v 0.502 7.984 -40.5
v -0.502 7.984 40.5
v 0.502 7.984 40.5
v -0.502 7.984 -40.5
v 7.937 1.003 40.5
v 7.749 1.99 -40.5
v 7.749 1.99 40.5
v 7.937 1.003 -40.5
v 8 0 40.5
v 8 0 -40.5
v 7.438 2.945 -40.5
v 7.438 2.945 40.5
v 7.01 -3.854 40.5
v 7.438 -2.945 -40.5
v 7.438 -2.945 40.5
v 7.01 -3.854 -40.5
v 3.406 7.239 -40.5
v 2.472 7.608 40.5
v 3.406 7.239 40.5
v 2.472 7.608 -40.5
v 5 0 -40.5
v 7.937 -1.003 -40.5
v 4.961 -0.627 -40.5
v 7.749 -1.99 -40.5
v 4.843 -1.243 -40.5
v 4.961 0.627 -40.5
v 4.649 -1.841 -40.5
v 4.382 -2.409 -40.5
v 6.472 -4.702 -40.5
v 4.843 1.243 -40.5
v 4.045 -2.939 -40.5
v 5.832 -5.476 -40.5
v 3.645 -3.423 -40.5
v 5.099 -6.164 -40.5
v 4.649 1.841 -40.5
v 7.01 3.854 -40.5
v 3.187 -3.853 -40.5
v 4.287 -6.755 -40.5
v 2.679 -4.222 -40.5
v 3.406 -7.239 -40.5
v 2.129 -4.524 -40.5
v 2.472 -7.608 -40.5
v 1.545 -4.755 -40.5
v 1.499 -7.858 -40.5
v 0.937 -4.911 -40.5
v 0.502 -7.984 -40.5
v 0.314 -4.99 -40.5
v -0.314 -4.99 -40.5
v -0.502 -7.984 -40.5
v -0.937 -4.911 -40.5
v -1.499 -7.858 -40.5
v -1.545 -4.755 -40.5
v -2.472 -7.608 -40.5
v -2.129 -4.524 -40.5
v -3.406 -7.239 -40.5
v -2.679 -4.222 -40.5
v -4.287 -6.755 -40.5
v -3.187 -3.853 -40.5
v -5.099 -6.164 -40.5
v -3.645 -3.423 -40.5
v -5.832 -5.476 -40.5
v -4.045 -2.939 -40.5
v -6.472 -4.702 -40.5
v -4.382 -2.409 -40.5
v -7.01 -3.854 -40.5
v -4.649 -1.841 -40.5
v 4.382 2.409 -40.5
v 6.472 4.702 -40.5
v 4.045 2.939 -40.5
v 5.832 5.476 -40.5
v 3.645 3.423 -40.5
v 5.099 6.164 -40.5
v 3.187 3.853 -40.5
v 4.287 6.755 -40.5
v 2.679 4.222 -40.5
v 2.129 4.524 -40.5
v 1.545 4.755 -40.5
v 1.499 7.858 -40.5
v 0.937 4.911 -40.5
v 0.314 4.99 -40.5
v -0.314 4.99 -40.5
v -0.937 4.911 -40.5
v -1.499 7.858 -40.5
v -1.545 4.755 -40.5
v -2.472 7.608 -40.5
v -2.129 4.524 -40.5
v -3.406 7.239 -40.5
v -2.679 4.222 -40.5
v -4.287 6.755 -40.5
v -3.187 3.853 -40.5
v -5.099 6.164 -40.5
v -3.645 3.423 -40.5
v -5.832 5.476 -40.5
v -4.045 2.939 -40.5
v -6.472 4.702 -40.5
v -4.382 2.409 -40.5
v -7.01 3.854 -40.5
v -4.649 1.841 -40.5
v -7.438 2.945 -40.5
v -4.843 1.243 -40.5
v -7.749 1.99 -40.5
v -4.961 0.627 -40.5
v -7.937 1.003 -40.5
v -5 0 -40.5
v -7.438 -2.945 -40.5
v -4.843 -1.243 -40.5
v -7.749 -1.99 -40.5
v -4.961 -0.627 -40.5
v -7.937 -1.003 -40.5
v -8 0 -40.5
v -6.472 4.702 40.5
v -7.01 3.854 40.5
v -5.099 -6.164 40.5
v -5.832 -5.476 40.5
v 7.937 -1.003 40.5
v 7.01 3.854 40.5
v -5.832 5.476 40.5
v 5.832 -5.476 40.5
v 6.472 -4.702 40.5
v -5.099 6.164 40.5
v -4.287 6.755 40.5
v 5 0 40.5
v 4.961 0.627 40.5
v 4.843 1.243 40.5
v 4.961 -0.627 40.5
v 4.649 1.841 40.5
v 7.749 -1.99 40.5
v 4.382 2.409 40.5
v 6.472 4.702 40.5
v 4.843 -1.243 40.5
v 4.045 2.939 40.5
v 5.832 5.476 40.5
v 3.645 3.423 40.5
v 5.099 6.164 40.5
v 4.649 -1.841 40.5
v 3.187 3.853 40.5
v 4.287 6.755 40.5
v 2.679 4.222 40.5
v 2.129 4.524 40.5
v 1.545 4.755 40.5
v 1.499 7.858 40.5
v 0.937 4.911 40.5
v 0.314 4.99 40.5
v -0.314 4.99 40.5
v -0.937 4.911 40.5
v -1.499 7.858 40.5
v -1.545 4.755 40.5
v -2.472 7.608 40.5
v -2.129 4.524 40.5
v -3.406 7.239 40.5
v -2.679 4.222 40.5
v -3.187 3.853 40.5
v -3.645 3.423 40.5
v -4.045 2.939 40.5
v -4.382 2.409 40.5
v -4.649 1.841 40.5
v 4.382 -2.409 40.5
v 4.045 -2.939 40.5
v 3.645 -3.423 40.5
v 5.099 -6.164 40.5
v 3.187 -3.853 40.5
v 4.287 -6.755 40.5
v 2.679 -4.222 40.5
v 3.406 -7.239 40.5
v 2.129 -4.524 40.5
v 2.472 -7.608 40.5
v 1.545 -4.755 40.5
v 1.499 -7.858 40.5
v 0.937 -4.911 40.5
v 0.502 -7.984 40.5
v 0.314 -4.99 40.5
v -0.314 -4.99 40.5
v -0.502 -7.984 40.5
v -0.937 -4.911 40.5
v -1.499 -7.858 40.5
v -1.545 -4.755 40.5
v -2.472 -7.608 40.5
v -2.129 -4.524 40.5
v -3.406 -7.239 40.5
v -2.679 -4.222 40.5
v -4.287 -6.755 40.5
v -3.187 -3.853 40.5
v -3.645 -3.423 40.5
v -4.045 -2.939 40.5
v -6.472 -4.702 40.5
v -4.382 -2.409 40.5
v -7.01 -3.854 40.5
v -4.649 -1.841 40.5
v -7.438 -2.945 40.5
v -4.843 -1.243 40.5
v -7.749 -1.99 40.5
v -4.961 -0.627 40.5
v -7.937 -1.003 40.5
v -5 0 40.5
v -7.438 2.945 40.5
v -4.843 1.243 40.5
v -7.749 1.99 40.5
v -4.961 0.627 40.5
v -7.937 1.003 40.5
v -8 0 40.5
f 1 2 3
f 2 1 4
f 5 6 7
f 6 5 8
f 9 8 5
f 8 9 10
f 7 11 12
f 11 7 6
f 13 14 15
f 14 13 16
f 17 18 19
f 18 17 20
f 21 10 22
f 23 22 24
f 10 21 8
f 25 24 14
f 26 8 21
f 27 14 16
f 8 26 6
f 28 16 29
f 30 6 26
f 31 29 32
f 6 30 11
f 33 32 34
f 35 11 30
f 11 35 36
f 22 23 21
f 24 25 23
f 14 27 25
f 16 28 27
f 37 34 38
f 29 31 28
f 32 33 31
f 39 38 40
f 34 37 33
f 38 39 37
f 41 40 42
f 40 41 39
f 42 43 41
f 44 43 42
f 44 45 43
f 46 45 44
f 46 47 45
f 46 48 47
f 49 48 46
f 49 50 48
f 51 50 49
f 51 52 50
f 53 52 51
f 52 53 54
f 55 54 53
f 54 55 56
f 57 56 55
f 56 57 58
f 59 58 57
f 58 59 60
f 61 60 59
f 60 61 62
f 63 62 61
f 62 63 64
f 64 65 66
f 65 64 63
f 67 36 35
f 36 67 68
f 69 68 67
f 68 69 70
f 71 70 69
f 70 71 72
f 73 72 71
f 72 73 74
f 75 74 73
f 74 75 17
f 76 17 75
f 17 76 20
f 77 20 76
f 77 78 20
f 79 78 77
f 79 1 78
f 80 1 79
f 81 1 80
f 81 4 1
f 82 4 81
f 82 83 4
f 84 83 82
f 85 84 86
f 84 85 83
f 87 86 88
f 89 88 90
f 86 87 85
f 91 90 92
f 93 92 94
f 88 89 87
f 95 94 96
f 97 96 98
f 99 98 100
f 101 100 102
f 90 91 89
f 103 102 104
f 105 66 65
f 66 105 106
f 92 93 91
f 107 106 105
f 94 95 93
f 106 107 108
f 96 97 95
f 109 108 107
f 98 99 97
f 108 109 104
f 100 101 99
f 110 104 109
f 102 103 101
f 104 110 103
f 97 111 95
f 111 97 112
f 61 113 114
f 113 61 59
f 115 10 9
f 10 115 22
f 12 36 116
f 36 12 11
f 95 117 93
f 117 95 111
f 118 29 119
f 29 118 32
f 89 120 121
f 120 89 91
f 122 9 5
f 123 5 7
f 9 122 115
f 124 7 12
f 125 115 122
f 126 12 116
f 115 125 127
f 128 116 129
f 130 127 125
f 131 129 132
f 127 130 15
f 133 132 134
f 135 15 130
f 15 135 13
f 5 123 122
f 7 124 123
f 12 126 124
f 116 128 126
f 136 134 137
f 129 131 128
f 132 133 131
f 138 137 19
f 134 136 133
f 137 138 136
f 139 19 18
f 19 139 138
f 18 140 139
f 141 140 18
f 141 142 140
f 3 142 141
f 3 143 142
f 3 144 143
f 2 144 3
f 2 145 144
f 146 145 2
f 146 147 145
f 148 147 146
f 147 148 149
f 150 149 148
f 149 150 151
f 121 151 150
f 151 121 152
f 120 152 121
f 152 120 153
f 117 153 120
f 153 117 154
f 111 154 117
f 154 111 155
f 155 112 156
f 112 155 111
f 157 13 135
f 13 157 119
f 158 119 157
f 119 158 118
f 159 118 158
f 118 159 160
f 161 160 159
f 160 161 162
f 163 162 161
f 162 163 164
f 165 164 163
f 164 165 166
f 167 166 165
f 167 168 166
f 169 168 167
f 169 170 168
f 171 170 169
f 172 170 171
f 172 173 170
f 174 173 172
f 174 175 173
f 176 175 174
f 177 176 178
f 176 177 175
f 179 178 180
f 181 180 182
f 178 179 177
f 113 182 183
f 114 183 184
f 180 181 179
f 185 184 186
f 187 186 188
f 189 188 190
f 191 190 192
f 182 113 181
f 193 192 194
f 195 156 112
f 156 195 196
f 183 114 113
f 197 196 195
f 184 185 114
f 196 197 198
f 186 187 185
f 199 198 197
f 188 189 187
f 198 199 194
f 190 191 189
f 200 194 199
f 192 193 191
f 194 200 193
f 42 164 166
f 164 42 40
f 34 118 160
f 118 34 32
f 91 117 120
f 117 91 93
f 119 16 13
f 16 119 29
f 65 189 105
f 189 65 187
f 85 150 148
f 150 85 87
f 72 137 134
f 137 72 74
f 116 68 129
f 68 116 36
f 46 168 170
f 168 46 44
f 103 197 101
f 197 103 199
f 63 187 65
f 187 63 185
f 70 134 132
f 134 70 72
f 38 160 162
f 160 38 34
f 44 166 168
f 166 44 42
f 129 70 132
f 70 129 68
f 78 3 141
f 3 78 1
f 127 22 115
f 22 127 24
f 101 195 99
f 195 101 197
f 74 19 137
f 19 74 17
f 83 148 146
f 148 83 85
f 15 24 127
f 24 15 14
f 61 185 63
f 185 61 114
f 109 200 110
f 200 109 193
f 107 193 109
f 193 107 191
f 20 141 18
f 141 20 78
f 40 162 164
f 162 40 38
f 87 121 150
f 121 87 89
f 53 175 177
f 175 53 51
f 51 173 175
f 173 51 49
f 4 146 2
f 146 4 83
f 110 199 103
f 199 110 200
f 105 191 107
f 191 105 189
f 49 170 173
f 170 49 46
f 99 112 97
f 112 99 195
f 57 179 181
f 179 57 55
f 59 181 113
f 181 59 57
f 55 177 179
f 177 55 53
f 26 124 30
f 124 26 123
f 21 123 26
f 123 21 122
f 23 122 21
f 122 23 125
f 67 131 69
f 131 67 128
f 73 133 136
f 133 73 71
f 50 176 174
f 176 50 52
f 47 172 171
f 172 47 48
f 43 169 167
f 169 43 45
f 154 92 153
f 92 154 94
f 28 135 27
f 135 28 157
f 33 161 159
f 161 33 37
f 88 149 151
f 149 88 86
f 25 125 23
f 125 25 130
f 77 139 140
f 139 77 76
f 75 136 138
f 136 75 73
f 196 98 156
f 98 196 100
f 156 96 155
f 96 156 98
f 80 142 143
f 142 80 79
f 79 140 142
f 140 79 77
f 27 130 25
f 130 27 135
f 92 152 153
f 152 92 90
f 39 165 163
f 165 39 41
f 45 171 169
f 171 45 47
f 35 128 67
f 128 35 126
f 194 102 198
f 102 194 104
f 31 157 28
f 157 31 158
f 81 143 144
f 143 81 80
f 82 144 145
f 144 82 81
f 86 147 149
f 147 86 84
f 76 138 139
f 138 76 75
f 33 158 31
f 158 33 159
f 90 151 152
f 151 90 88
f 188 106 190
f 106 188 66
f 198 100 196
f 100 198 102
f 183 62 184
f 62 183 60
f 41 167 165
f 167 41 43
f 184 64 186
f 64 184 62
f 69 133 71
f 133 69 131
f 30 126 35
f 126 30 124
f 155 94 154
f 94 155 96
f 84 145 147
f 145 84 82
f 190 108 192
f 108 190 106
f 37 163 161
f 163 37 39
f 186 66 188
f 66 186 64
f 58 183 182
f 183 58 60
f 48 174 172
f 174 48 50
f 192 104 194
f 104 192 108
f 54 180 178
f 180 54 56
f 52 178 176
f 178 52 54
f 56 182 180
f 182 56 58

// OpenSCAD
$fn = 50;


difference() {
	union() {
		translate(v = [0, 0, -40.5000000000]) {
			cylinder(h = 81, r = 8.0000000000);
		}
	}
	union() {
		translate(v = [0, 0, -100.0000000000]) {
			cylinder(h = 200, r = 5.0000000000);
		}
	}
}
